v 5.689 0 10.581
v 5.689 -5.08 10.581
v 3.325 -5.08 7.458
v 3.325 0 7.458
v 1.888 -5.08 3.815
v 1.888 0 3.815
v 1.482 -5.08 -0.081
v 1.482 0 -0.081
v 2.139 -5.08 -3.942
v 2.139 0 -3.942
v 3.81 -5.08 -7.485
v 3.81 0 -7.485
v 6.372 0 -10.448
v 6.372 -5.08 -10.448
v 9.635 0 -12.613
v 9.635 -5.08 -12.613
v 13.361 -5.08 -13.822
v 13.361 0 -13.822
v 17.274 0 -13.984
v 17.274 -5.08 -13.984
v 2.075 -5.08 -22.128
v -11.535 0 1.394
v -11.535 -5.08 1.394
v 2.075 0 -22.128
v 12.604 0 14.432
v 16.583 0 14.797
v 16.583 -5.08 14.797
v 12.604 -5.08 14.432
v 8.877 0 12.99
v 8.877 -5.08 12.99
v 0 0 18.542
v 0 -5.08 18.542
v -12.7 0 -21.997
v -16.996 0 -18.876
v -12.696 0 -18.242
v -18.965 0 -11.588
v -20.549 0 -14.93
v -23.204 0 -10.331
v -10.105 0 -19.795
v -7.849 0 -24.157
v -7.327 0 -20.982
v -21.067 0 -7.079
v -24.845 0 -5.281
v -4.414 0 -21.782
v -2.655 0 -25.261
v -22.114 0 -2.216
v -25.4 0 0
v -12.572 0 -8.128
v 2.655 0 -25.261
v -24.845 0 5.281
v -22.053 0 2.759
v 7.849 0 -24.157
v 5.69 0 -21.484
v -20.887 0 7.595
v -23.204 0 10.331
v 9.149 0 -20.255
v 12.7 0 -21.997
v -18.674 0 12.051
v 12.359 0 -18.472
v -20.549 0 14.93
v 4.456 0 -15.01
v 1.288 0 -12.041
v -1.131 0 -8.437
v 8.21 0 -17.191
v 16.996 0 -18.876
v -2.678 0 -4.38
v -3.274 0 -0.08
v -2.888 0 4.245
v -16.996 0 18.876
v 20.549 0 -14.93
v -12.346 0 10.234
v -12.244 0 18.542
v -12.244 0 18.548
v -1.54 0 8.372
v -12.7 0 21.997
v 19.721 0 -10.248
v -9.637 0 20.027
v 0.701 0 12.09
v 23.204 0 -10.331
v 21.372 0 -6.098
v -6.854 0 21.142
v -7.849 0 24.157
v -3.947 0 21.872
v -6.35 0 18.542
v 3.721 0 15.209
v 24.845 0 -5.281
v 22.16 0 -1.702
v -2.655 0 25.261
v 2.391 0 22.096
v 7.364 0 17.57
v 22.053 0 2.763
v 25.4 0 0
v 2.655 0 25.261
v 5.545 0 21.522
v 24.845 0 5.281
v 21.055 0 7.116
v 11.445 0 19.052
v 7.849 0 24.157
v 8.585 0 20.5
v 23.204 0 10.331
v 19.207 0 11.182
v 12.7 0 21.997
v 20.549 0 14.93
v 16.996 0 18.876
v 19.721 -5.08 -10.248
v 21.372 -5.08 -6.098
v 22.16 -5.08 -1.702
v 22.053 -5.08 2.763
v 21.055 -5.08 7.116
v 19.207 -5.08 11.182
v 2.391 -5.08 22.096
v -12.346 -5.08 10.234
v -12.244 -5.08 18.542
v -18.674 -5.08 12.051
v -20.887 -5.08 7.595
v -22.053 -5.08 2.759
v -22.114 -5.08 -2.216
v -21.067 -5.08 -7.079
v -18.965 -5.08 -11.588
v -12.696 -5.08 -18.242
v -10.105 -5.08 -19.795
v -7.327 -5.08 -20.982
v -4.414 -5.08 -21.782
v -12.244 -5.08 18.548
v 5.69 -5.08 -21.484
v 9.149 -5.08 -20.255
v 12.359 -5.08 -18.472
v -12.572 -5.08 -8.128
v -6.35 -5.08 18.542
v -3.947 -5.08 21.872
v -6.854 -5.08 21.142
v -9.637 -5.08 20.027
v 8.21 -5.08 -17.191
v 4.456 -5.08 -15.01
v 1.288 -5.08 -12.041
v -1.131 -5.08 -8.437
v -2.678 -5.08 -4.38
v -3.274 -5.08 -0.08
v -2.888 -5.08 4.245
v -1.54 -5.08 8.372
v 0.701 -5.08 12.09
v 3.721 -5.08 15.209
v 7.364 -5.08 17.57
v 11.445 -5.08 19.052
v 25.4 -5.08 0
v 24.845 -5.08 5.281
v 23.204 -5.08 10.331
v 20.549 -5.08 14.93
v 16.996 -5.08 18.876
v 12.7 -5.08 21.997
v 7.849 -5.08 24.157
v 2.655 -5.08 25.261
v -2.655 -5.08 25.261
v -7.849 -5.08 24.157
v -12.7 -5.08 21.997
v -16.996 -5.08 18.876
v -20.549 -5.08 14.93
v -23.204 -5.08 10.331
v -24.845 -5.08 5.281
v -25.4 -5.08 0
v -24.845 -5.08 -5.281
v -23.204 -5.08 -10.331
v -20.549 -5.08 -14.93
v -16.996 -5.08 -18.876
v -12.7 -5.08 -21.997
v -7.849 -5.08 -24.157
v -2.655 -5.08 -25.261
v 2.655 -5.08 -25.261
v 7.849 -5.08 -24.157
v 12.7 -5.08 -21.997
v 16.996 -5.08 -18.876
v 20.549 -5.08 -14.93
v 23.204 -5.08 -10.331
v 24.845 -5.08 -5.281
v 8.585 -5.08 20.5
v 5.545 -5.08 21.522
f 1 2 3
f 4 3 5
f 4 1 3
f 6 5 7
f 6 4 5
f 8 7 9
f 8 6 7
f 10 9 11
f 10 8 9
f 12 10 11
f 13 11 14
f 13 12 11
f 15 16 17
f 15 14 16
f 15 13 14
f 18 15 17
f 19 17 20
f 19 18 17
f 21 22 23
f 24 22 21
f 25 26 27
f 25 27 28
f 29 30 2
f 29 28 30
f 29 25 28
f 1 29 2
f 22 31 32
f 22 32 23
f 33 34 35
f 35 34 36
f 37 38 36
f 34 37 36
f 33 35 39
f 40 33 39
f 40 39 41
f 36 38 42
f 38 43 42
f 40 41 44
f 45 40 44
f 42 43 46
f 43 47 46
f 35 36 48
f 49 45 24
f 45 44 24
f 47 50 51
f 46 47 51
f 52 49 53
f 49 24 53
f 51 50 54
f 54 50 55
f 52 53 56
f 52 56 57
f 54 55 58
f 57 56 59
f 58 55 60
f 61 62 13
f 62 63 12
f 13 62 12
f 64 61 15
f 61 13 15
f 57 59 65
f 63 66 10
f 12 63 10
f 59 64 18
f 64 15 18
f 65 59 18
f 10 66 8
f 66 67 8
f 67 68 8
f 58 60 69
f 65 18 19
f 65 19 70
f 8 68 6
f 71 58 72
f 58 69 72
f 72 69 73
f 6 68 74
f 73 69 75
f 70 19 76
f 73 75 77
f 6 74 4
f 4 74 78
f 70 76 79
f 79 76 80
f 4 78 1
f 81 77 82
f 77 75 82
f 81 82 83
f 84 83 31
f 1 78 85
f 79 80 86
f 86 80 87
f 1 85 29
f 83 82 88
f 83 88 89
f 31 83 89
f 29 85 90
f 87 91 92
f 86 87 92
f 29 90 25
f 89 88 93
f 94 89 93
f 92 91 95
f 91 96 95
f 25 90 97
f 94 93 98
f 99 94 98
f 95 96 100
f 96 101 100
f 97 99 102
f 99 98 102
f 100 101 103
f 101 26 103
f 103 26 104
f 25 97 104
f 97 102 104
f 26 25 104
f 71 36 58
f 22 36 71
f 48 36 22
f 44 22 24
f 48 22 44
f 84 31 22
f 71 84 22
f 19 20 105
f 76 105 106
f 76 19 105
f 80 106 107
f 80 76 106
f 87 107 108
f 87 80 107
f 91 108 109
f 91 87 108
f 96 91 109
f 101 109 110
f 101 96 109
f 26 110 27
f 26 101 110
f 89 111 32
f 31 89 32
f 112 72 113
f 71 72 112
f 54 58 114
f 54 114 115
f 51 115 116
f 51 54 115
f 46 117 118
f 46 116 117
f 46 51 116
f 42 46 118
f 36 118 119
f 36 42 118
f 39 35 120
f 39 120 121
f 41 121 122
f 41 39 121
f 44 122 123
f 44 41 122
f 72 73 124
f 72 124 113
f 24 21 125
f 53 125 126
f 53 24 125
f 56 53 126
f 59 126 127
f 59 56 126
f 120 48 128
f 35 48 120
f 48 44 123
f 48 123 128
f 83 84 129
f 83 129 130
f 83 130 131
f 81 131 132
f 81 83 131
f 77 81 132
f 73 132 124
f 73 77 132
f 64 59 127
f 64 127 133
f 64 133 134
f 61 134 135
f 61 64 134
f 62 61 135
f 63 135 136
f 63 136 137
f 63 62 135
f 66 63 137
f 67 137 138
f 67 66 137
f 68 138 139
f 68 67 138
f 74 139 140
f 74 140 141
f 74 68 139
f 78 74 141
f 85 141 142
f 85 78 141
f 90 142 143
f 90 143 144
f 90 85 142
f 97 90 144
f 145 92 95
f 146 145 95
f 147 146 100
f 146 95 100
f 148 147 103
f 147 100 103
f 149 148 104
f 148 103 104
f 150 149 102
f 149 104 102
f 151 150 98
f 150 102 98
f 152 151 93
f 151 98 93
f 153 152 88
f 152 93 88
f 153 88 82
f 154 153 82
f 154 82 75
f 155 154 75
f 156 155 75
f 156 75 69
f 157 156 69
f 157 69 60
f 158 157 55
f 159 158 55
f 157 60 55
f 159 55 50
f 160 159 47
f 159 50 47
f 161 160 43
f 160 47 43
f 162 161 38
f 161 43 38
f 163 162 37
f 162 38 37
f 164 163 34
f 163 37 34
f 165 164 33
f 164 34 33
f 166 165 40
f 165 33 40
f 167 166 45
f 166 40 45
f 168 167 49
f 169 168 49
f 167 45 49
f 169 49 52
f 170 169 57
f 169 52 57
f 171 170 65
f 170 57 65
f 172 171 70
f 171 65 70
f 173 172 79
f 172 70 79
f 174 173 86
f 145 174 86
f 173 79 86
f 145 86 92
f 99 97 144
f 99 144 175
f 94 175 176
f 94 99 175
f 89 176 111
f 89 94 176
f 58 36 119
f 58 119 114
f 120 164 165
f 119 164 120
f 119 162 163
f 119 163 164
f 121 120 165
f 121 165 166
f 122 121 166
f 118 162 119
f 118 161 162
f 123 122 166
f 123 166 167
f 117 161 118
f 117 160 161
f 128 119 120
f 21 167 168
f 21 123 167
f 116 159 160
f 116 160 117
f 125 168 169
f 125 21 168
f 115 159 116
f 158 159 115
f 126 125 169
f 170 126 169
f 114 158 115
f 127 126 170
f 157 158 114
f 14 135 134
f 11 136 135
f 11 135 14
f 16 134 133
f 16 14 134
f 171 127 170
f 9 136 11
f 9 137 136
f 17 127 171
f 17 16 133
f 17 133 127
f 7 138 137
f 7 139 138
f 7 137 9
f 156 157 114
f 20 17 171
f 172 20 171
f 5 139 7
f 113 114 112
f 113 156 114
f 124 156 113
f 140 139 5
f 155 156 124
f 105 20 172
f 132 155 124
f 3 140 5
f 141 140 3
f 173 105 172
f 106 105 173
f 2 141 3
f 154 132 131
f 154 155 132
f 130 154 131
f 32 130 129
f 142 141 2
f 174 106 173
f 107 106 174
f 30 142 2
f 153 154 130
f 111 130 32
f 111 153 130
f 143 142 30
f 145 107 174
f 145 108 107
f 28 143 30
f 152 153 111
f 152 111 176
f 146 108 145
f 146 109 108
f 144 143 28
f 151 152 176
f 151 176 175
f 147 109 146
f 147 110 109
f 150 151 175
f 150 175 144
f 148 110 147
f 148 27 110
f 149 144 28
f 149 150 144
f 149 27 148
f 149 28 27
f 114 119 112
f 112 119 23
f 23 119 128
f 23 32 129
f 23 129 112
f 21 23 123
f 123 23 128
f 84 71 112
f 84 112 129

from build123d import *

# Parameters (mm, degrees)
F1_R     = 25.4
F2_DEPTH = 5.08
F3_DEPTH = 25.4


with BuildPart() as f2:
    # F1 (on face) → F2 (new body)
    with BuildSketch(Plane.XZ):
        Circle(F1_R)
    extrude(amount=F2_DEPTH)

    # F0 (on Front) → F3 (cut)
    with BuildSketch(Plane.XZ):
        with BuildLine():
            Line((-18.9649743836, -11.5879407846), (-18.6743181879, 12.0507454217))
            ThreePointArc((-18.6743181879, 12.0507454217), (-22.2233201325, 0.2732531593), (-18.9649743836, -11.5879407846))
        make_face()
        with BuildLine():
            Line((-12.2440231208, 18.5481676404), (-12.2440231208, 18.542))
            Line((-12.2440231208, 18.542), (-12.3461767338, 10.2339809879))
            Line((-12.3461767338, 10.2339809879), (-6.35, 18.542))
            Line((-6.35, 18.542), (-3.9468095651, 21.8717470554))
            ThreePointArc((-3.9468095651, 21.8717470554), (-8.2642187046, 20.6313672403), (-12.2440231208, 18.5481676404))
        make_face()
        with BuildLine():
            Line((2.3905855561, 22.0960567907), (0, 18.542))
            Line((0, 18.542), (-11.534660226, 1.393549738))
            Line((-11.534660226, 1.393549738), (0, -18.542))
            Line((0, -18.542), (2.0748165247, -22.1279407399))
            ThreePointArc((2.0748165247, -22.1279407399), (7.4446563645, -20.9410533788), (12.3586706752, -18.4719756426))
            ThreePointArc((12.3586706752, -18.4719756426), (-3.2744047046, -0.079723759), (11.4450647322, 19.0515384753))
            ThreePointArc((11.4450647322, 19.0515384753), (7.0833309726, 21.0660164087), (2.3905855561, 22.0960567907))
        make_face()
        with BuildLine():
            Line((-12.5719566873, -8.1284057478), (-12.6963058315, -18.2415581361))
            ThreePointArc((-12.6963058315, -18.2415581361), (-8.7364017757, -20.4358975583), (-4.4139898466, -21.782270741))
            Line((-4.4139898466, -21.782270741), (-6.35, -18.542))
            Line((-6.35, -18.542), (-12.5719566873, -8.1284057478))
        make_face()
        with BuildLine():
            ThreePointArc((5.688669798, 10.580847501), (2.8540606181, -5.7704887525), (17.2740589748, -13.9841879112))
            ThreePointArc((17.2740589748, -13.9841879112), (22.2186031718, 0.533196112), (16.5833831495, 14.7966897756))
            ThreePointArc((16.5833831495, 14.7966897756), (10.6903796192, 13.8404233779), (5.688669798, 10.580847501))
        make_face()
    extrude(amount=F3_DEPTH, mode=Mode.SUBTRACT)


solid = f2.part
